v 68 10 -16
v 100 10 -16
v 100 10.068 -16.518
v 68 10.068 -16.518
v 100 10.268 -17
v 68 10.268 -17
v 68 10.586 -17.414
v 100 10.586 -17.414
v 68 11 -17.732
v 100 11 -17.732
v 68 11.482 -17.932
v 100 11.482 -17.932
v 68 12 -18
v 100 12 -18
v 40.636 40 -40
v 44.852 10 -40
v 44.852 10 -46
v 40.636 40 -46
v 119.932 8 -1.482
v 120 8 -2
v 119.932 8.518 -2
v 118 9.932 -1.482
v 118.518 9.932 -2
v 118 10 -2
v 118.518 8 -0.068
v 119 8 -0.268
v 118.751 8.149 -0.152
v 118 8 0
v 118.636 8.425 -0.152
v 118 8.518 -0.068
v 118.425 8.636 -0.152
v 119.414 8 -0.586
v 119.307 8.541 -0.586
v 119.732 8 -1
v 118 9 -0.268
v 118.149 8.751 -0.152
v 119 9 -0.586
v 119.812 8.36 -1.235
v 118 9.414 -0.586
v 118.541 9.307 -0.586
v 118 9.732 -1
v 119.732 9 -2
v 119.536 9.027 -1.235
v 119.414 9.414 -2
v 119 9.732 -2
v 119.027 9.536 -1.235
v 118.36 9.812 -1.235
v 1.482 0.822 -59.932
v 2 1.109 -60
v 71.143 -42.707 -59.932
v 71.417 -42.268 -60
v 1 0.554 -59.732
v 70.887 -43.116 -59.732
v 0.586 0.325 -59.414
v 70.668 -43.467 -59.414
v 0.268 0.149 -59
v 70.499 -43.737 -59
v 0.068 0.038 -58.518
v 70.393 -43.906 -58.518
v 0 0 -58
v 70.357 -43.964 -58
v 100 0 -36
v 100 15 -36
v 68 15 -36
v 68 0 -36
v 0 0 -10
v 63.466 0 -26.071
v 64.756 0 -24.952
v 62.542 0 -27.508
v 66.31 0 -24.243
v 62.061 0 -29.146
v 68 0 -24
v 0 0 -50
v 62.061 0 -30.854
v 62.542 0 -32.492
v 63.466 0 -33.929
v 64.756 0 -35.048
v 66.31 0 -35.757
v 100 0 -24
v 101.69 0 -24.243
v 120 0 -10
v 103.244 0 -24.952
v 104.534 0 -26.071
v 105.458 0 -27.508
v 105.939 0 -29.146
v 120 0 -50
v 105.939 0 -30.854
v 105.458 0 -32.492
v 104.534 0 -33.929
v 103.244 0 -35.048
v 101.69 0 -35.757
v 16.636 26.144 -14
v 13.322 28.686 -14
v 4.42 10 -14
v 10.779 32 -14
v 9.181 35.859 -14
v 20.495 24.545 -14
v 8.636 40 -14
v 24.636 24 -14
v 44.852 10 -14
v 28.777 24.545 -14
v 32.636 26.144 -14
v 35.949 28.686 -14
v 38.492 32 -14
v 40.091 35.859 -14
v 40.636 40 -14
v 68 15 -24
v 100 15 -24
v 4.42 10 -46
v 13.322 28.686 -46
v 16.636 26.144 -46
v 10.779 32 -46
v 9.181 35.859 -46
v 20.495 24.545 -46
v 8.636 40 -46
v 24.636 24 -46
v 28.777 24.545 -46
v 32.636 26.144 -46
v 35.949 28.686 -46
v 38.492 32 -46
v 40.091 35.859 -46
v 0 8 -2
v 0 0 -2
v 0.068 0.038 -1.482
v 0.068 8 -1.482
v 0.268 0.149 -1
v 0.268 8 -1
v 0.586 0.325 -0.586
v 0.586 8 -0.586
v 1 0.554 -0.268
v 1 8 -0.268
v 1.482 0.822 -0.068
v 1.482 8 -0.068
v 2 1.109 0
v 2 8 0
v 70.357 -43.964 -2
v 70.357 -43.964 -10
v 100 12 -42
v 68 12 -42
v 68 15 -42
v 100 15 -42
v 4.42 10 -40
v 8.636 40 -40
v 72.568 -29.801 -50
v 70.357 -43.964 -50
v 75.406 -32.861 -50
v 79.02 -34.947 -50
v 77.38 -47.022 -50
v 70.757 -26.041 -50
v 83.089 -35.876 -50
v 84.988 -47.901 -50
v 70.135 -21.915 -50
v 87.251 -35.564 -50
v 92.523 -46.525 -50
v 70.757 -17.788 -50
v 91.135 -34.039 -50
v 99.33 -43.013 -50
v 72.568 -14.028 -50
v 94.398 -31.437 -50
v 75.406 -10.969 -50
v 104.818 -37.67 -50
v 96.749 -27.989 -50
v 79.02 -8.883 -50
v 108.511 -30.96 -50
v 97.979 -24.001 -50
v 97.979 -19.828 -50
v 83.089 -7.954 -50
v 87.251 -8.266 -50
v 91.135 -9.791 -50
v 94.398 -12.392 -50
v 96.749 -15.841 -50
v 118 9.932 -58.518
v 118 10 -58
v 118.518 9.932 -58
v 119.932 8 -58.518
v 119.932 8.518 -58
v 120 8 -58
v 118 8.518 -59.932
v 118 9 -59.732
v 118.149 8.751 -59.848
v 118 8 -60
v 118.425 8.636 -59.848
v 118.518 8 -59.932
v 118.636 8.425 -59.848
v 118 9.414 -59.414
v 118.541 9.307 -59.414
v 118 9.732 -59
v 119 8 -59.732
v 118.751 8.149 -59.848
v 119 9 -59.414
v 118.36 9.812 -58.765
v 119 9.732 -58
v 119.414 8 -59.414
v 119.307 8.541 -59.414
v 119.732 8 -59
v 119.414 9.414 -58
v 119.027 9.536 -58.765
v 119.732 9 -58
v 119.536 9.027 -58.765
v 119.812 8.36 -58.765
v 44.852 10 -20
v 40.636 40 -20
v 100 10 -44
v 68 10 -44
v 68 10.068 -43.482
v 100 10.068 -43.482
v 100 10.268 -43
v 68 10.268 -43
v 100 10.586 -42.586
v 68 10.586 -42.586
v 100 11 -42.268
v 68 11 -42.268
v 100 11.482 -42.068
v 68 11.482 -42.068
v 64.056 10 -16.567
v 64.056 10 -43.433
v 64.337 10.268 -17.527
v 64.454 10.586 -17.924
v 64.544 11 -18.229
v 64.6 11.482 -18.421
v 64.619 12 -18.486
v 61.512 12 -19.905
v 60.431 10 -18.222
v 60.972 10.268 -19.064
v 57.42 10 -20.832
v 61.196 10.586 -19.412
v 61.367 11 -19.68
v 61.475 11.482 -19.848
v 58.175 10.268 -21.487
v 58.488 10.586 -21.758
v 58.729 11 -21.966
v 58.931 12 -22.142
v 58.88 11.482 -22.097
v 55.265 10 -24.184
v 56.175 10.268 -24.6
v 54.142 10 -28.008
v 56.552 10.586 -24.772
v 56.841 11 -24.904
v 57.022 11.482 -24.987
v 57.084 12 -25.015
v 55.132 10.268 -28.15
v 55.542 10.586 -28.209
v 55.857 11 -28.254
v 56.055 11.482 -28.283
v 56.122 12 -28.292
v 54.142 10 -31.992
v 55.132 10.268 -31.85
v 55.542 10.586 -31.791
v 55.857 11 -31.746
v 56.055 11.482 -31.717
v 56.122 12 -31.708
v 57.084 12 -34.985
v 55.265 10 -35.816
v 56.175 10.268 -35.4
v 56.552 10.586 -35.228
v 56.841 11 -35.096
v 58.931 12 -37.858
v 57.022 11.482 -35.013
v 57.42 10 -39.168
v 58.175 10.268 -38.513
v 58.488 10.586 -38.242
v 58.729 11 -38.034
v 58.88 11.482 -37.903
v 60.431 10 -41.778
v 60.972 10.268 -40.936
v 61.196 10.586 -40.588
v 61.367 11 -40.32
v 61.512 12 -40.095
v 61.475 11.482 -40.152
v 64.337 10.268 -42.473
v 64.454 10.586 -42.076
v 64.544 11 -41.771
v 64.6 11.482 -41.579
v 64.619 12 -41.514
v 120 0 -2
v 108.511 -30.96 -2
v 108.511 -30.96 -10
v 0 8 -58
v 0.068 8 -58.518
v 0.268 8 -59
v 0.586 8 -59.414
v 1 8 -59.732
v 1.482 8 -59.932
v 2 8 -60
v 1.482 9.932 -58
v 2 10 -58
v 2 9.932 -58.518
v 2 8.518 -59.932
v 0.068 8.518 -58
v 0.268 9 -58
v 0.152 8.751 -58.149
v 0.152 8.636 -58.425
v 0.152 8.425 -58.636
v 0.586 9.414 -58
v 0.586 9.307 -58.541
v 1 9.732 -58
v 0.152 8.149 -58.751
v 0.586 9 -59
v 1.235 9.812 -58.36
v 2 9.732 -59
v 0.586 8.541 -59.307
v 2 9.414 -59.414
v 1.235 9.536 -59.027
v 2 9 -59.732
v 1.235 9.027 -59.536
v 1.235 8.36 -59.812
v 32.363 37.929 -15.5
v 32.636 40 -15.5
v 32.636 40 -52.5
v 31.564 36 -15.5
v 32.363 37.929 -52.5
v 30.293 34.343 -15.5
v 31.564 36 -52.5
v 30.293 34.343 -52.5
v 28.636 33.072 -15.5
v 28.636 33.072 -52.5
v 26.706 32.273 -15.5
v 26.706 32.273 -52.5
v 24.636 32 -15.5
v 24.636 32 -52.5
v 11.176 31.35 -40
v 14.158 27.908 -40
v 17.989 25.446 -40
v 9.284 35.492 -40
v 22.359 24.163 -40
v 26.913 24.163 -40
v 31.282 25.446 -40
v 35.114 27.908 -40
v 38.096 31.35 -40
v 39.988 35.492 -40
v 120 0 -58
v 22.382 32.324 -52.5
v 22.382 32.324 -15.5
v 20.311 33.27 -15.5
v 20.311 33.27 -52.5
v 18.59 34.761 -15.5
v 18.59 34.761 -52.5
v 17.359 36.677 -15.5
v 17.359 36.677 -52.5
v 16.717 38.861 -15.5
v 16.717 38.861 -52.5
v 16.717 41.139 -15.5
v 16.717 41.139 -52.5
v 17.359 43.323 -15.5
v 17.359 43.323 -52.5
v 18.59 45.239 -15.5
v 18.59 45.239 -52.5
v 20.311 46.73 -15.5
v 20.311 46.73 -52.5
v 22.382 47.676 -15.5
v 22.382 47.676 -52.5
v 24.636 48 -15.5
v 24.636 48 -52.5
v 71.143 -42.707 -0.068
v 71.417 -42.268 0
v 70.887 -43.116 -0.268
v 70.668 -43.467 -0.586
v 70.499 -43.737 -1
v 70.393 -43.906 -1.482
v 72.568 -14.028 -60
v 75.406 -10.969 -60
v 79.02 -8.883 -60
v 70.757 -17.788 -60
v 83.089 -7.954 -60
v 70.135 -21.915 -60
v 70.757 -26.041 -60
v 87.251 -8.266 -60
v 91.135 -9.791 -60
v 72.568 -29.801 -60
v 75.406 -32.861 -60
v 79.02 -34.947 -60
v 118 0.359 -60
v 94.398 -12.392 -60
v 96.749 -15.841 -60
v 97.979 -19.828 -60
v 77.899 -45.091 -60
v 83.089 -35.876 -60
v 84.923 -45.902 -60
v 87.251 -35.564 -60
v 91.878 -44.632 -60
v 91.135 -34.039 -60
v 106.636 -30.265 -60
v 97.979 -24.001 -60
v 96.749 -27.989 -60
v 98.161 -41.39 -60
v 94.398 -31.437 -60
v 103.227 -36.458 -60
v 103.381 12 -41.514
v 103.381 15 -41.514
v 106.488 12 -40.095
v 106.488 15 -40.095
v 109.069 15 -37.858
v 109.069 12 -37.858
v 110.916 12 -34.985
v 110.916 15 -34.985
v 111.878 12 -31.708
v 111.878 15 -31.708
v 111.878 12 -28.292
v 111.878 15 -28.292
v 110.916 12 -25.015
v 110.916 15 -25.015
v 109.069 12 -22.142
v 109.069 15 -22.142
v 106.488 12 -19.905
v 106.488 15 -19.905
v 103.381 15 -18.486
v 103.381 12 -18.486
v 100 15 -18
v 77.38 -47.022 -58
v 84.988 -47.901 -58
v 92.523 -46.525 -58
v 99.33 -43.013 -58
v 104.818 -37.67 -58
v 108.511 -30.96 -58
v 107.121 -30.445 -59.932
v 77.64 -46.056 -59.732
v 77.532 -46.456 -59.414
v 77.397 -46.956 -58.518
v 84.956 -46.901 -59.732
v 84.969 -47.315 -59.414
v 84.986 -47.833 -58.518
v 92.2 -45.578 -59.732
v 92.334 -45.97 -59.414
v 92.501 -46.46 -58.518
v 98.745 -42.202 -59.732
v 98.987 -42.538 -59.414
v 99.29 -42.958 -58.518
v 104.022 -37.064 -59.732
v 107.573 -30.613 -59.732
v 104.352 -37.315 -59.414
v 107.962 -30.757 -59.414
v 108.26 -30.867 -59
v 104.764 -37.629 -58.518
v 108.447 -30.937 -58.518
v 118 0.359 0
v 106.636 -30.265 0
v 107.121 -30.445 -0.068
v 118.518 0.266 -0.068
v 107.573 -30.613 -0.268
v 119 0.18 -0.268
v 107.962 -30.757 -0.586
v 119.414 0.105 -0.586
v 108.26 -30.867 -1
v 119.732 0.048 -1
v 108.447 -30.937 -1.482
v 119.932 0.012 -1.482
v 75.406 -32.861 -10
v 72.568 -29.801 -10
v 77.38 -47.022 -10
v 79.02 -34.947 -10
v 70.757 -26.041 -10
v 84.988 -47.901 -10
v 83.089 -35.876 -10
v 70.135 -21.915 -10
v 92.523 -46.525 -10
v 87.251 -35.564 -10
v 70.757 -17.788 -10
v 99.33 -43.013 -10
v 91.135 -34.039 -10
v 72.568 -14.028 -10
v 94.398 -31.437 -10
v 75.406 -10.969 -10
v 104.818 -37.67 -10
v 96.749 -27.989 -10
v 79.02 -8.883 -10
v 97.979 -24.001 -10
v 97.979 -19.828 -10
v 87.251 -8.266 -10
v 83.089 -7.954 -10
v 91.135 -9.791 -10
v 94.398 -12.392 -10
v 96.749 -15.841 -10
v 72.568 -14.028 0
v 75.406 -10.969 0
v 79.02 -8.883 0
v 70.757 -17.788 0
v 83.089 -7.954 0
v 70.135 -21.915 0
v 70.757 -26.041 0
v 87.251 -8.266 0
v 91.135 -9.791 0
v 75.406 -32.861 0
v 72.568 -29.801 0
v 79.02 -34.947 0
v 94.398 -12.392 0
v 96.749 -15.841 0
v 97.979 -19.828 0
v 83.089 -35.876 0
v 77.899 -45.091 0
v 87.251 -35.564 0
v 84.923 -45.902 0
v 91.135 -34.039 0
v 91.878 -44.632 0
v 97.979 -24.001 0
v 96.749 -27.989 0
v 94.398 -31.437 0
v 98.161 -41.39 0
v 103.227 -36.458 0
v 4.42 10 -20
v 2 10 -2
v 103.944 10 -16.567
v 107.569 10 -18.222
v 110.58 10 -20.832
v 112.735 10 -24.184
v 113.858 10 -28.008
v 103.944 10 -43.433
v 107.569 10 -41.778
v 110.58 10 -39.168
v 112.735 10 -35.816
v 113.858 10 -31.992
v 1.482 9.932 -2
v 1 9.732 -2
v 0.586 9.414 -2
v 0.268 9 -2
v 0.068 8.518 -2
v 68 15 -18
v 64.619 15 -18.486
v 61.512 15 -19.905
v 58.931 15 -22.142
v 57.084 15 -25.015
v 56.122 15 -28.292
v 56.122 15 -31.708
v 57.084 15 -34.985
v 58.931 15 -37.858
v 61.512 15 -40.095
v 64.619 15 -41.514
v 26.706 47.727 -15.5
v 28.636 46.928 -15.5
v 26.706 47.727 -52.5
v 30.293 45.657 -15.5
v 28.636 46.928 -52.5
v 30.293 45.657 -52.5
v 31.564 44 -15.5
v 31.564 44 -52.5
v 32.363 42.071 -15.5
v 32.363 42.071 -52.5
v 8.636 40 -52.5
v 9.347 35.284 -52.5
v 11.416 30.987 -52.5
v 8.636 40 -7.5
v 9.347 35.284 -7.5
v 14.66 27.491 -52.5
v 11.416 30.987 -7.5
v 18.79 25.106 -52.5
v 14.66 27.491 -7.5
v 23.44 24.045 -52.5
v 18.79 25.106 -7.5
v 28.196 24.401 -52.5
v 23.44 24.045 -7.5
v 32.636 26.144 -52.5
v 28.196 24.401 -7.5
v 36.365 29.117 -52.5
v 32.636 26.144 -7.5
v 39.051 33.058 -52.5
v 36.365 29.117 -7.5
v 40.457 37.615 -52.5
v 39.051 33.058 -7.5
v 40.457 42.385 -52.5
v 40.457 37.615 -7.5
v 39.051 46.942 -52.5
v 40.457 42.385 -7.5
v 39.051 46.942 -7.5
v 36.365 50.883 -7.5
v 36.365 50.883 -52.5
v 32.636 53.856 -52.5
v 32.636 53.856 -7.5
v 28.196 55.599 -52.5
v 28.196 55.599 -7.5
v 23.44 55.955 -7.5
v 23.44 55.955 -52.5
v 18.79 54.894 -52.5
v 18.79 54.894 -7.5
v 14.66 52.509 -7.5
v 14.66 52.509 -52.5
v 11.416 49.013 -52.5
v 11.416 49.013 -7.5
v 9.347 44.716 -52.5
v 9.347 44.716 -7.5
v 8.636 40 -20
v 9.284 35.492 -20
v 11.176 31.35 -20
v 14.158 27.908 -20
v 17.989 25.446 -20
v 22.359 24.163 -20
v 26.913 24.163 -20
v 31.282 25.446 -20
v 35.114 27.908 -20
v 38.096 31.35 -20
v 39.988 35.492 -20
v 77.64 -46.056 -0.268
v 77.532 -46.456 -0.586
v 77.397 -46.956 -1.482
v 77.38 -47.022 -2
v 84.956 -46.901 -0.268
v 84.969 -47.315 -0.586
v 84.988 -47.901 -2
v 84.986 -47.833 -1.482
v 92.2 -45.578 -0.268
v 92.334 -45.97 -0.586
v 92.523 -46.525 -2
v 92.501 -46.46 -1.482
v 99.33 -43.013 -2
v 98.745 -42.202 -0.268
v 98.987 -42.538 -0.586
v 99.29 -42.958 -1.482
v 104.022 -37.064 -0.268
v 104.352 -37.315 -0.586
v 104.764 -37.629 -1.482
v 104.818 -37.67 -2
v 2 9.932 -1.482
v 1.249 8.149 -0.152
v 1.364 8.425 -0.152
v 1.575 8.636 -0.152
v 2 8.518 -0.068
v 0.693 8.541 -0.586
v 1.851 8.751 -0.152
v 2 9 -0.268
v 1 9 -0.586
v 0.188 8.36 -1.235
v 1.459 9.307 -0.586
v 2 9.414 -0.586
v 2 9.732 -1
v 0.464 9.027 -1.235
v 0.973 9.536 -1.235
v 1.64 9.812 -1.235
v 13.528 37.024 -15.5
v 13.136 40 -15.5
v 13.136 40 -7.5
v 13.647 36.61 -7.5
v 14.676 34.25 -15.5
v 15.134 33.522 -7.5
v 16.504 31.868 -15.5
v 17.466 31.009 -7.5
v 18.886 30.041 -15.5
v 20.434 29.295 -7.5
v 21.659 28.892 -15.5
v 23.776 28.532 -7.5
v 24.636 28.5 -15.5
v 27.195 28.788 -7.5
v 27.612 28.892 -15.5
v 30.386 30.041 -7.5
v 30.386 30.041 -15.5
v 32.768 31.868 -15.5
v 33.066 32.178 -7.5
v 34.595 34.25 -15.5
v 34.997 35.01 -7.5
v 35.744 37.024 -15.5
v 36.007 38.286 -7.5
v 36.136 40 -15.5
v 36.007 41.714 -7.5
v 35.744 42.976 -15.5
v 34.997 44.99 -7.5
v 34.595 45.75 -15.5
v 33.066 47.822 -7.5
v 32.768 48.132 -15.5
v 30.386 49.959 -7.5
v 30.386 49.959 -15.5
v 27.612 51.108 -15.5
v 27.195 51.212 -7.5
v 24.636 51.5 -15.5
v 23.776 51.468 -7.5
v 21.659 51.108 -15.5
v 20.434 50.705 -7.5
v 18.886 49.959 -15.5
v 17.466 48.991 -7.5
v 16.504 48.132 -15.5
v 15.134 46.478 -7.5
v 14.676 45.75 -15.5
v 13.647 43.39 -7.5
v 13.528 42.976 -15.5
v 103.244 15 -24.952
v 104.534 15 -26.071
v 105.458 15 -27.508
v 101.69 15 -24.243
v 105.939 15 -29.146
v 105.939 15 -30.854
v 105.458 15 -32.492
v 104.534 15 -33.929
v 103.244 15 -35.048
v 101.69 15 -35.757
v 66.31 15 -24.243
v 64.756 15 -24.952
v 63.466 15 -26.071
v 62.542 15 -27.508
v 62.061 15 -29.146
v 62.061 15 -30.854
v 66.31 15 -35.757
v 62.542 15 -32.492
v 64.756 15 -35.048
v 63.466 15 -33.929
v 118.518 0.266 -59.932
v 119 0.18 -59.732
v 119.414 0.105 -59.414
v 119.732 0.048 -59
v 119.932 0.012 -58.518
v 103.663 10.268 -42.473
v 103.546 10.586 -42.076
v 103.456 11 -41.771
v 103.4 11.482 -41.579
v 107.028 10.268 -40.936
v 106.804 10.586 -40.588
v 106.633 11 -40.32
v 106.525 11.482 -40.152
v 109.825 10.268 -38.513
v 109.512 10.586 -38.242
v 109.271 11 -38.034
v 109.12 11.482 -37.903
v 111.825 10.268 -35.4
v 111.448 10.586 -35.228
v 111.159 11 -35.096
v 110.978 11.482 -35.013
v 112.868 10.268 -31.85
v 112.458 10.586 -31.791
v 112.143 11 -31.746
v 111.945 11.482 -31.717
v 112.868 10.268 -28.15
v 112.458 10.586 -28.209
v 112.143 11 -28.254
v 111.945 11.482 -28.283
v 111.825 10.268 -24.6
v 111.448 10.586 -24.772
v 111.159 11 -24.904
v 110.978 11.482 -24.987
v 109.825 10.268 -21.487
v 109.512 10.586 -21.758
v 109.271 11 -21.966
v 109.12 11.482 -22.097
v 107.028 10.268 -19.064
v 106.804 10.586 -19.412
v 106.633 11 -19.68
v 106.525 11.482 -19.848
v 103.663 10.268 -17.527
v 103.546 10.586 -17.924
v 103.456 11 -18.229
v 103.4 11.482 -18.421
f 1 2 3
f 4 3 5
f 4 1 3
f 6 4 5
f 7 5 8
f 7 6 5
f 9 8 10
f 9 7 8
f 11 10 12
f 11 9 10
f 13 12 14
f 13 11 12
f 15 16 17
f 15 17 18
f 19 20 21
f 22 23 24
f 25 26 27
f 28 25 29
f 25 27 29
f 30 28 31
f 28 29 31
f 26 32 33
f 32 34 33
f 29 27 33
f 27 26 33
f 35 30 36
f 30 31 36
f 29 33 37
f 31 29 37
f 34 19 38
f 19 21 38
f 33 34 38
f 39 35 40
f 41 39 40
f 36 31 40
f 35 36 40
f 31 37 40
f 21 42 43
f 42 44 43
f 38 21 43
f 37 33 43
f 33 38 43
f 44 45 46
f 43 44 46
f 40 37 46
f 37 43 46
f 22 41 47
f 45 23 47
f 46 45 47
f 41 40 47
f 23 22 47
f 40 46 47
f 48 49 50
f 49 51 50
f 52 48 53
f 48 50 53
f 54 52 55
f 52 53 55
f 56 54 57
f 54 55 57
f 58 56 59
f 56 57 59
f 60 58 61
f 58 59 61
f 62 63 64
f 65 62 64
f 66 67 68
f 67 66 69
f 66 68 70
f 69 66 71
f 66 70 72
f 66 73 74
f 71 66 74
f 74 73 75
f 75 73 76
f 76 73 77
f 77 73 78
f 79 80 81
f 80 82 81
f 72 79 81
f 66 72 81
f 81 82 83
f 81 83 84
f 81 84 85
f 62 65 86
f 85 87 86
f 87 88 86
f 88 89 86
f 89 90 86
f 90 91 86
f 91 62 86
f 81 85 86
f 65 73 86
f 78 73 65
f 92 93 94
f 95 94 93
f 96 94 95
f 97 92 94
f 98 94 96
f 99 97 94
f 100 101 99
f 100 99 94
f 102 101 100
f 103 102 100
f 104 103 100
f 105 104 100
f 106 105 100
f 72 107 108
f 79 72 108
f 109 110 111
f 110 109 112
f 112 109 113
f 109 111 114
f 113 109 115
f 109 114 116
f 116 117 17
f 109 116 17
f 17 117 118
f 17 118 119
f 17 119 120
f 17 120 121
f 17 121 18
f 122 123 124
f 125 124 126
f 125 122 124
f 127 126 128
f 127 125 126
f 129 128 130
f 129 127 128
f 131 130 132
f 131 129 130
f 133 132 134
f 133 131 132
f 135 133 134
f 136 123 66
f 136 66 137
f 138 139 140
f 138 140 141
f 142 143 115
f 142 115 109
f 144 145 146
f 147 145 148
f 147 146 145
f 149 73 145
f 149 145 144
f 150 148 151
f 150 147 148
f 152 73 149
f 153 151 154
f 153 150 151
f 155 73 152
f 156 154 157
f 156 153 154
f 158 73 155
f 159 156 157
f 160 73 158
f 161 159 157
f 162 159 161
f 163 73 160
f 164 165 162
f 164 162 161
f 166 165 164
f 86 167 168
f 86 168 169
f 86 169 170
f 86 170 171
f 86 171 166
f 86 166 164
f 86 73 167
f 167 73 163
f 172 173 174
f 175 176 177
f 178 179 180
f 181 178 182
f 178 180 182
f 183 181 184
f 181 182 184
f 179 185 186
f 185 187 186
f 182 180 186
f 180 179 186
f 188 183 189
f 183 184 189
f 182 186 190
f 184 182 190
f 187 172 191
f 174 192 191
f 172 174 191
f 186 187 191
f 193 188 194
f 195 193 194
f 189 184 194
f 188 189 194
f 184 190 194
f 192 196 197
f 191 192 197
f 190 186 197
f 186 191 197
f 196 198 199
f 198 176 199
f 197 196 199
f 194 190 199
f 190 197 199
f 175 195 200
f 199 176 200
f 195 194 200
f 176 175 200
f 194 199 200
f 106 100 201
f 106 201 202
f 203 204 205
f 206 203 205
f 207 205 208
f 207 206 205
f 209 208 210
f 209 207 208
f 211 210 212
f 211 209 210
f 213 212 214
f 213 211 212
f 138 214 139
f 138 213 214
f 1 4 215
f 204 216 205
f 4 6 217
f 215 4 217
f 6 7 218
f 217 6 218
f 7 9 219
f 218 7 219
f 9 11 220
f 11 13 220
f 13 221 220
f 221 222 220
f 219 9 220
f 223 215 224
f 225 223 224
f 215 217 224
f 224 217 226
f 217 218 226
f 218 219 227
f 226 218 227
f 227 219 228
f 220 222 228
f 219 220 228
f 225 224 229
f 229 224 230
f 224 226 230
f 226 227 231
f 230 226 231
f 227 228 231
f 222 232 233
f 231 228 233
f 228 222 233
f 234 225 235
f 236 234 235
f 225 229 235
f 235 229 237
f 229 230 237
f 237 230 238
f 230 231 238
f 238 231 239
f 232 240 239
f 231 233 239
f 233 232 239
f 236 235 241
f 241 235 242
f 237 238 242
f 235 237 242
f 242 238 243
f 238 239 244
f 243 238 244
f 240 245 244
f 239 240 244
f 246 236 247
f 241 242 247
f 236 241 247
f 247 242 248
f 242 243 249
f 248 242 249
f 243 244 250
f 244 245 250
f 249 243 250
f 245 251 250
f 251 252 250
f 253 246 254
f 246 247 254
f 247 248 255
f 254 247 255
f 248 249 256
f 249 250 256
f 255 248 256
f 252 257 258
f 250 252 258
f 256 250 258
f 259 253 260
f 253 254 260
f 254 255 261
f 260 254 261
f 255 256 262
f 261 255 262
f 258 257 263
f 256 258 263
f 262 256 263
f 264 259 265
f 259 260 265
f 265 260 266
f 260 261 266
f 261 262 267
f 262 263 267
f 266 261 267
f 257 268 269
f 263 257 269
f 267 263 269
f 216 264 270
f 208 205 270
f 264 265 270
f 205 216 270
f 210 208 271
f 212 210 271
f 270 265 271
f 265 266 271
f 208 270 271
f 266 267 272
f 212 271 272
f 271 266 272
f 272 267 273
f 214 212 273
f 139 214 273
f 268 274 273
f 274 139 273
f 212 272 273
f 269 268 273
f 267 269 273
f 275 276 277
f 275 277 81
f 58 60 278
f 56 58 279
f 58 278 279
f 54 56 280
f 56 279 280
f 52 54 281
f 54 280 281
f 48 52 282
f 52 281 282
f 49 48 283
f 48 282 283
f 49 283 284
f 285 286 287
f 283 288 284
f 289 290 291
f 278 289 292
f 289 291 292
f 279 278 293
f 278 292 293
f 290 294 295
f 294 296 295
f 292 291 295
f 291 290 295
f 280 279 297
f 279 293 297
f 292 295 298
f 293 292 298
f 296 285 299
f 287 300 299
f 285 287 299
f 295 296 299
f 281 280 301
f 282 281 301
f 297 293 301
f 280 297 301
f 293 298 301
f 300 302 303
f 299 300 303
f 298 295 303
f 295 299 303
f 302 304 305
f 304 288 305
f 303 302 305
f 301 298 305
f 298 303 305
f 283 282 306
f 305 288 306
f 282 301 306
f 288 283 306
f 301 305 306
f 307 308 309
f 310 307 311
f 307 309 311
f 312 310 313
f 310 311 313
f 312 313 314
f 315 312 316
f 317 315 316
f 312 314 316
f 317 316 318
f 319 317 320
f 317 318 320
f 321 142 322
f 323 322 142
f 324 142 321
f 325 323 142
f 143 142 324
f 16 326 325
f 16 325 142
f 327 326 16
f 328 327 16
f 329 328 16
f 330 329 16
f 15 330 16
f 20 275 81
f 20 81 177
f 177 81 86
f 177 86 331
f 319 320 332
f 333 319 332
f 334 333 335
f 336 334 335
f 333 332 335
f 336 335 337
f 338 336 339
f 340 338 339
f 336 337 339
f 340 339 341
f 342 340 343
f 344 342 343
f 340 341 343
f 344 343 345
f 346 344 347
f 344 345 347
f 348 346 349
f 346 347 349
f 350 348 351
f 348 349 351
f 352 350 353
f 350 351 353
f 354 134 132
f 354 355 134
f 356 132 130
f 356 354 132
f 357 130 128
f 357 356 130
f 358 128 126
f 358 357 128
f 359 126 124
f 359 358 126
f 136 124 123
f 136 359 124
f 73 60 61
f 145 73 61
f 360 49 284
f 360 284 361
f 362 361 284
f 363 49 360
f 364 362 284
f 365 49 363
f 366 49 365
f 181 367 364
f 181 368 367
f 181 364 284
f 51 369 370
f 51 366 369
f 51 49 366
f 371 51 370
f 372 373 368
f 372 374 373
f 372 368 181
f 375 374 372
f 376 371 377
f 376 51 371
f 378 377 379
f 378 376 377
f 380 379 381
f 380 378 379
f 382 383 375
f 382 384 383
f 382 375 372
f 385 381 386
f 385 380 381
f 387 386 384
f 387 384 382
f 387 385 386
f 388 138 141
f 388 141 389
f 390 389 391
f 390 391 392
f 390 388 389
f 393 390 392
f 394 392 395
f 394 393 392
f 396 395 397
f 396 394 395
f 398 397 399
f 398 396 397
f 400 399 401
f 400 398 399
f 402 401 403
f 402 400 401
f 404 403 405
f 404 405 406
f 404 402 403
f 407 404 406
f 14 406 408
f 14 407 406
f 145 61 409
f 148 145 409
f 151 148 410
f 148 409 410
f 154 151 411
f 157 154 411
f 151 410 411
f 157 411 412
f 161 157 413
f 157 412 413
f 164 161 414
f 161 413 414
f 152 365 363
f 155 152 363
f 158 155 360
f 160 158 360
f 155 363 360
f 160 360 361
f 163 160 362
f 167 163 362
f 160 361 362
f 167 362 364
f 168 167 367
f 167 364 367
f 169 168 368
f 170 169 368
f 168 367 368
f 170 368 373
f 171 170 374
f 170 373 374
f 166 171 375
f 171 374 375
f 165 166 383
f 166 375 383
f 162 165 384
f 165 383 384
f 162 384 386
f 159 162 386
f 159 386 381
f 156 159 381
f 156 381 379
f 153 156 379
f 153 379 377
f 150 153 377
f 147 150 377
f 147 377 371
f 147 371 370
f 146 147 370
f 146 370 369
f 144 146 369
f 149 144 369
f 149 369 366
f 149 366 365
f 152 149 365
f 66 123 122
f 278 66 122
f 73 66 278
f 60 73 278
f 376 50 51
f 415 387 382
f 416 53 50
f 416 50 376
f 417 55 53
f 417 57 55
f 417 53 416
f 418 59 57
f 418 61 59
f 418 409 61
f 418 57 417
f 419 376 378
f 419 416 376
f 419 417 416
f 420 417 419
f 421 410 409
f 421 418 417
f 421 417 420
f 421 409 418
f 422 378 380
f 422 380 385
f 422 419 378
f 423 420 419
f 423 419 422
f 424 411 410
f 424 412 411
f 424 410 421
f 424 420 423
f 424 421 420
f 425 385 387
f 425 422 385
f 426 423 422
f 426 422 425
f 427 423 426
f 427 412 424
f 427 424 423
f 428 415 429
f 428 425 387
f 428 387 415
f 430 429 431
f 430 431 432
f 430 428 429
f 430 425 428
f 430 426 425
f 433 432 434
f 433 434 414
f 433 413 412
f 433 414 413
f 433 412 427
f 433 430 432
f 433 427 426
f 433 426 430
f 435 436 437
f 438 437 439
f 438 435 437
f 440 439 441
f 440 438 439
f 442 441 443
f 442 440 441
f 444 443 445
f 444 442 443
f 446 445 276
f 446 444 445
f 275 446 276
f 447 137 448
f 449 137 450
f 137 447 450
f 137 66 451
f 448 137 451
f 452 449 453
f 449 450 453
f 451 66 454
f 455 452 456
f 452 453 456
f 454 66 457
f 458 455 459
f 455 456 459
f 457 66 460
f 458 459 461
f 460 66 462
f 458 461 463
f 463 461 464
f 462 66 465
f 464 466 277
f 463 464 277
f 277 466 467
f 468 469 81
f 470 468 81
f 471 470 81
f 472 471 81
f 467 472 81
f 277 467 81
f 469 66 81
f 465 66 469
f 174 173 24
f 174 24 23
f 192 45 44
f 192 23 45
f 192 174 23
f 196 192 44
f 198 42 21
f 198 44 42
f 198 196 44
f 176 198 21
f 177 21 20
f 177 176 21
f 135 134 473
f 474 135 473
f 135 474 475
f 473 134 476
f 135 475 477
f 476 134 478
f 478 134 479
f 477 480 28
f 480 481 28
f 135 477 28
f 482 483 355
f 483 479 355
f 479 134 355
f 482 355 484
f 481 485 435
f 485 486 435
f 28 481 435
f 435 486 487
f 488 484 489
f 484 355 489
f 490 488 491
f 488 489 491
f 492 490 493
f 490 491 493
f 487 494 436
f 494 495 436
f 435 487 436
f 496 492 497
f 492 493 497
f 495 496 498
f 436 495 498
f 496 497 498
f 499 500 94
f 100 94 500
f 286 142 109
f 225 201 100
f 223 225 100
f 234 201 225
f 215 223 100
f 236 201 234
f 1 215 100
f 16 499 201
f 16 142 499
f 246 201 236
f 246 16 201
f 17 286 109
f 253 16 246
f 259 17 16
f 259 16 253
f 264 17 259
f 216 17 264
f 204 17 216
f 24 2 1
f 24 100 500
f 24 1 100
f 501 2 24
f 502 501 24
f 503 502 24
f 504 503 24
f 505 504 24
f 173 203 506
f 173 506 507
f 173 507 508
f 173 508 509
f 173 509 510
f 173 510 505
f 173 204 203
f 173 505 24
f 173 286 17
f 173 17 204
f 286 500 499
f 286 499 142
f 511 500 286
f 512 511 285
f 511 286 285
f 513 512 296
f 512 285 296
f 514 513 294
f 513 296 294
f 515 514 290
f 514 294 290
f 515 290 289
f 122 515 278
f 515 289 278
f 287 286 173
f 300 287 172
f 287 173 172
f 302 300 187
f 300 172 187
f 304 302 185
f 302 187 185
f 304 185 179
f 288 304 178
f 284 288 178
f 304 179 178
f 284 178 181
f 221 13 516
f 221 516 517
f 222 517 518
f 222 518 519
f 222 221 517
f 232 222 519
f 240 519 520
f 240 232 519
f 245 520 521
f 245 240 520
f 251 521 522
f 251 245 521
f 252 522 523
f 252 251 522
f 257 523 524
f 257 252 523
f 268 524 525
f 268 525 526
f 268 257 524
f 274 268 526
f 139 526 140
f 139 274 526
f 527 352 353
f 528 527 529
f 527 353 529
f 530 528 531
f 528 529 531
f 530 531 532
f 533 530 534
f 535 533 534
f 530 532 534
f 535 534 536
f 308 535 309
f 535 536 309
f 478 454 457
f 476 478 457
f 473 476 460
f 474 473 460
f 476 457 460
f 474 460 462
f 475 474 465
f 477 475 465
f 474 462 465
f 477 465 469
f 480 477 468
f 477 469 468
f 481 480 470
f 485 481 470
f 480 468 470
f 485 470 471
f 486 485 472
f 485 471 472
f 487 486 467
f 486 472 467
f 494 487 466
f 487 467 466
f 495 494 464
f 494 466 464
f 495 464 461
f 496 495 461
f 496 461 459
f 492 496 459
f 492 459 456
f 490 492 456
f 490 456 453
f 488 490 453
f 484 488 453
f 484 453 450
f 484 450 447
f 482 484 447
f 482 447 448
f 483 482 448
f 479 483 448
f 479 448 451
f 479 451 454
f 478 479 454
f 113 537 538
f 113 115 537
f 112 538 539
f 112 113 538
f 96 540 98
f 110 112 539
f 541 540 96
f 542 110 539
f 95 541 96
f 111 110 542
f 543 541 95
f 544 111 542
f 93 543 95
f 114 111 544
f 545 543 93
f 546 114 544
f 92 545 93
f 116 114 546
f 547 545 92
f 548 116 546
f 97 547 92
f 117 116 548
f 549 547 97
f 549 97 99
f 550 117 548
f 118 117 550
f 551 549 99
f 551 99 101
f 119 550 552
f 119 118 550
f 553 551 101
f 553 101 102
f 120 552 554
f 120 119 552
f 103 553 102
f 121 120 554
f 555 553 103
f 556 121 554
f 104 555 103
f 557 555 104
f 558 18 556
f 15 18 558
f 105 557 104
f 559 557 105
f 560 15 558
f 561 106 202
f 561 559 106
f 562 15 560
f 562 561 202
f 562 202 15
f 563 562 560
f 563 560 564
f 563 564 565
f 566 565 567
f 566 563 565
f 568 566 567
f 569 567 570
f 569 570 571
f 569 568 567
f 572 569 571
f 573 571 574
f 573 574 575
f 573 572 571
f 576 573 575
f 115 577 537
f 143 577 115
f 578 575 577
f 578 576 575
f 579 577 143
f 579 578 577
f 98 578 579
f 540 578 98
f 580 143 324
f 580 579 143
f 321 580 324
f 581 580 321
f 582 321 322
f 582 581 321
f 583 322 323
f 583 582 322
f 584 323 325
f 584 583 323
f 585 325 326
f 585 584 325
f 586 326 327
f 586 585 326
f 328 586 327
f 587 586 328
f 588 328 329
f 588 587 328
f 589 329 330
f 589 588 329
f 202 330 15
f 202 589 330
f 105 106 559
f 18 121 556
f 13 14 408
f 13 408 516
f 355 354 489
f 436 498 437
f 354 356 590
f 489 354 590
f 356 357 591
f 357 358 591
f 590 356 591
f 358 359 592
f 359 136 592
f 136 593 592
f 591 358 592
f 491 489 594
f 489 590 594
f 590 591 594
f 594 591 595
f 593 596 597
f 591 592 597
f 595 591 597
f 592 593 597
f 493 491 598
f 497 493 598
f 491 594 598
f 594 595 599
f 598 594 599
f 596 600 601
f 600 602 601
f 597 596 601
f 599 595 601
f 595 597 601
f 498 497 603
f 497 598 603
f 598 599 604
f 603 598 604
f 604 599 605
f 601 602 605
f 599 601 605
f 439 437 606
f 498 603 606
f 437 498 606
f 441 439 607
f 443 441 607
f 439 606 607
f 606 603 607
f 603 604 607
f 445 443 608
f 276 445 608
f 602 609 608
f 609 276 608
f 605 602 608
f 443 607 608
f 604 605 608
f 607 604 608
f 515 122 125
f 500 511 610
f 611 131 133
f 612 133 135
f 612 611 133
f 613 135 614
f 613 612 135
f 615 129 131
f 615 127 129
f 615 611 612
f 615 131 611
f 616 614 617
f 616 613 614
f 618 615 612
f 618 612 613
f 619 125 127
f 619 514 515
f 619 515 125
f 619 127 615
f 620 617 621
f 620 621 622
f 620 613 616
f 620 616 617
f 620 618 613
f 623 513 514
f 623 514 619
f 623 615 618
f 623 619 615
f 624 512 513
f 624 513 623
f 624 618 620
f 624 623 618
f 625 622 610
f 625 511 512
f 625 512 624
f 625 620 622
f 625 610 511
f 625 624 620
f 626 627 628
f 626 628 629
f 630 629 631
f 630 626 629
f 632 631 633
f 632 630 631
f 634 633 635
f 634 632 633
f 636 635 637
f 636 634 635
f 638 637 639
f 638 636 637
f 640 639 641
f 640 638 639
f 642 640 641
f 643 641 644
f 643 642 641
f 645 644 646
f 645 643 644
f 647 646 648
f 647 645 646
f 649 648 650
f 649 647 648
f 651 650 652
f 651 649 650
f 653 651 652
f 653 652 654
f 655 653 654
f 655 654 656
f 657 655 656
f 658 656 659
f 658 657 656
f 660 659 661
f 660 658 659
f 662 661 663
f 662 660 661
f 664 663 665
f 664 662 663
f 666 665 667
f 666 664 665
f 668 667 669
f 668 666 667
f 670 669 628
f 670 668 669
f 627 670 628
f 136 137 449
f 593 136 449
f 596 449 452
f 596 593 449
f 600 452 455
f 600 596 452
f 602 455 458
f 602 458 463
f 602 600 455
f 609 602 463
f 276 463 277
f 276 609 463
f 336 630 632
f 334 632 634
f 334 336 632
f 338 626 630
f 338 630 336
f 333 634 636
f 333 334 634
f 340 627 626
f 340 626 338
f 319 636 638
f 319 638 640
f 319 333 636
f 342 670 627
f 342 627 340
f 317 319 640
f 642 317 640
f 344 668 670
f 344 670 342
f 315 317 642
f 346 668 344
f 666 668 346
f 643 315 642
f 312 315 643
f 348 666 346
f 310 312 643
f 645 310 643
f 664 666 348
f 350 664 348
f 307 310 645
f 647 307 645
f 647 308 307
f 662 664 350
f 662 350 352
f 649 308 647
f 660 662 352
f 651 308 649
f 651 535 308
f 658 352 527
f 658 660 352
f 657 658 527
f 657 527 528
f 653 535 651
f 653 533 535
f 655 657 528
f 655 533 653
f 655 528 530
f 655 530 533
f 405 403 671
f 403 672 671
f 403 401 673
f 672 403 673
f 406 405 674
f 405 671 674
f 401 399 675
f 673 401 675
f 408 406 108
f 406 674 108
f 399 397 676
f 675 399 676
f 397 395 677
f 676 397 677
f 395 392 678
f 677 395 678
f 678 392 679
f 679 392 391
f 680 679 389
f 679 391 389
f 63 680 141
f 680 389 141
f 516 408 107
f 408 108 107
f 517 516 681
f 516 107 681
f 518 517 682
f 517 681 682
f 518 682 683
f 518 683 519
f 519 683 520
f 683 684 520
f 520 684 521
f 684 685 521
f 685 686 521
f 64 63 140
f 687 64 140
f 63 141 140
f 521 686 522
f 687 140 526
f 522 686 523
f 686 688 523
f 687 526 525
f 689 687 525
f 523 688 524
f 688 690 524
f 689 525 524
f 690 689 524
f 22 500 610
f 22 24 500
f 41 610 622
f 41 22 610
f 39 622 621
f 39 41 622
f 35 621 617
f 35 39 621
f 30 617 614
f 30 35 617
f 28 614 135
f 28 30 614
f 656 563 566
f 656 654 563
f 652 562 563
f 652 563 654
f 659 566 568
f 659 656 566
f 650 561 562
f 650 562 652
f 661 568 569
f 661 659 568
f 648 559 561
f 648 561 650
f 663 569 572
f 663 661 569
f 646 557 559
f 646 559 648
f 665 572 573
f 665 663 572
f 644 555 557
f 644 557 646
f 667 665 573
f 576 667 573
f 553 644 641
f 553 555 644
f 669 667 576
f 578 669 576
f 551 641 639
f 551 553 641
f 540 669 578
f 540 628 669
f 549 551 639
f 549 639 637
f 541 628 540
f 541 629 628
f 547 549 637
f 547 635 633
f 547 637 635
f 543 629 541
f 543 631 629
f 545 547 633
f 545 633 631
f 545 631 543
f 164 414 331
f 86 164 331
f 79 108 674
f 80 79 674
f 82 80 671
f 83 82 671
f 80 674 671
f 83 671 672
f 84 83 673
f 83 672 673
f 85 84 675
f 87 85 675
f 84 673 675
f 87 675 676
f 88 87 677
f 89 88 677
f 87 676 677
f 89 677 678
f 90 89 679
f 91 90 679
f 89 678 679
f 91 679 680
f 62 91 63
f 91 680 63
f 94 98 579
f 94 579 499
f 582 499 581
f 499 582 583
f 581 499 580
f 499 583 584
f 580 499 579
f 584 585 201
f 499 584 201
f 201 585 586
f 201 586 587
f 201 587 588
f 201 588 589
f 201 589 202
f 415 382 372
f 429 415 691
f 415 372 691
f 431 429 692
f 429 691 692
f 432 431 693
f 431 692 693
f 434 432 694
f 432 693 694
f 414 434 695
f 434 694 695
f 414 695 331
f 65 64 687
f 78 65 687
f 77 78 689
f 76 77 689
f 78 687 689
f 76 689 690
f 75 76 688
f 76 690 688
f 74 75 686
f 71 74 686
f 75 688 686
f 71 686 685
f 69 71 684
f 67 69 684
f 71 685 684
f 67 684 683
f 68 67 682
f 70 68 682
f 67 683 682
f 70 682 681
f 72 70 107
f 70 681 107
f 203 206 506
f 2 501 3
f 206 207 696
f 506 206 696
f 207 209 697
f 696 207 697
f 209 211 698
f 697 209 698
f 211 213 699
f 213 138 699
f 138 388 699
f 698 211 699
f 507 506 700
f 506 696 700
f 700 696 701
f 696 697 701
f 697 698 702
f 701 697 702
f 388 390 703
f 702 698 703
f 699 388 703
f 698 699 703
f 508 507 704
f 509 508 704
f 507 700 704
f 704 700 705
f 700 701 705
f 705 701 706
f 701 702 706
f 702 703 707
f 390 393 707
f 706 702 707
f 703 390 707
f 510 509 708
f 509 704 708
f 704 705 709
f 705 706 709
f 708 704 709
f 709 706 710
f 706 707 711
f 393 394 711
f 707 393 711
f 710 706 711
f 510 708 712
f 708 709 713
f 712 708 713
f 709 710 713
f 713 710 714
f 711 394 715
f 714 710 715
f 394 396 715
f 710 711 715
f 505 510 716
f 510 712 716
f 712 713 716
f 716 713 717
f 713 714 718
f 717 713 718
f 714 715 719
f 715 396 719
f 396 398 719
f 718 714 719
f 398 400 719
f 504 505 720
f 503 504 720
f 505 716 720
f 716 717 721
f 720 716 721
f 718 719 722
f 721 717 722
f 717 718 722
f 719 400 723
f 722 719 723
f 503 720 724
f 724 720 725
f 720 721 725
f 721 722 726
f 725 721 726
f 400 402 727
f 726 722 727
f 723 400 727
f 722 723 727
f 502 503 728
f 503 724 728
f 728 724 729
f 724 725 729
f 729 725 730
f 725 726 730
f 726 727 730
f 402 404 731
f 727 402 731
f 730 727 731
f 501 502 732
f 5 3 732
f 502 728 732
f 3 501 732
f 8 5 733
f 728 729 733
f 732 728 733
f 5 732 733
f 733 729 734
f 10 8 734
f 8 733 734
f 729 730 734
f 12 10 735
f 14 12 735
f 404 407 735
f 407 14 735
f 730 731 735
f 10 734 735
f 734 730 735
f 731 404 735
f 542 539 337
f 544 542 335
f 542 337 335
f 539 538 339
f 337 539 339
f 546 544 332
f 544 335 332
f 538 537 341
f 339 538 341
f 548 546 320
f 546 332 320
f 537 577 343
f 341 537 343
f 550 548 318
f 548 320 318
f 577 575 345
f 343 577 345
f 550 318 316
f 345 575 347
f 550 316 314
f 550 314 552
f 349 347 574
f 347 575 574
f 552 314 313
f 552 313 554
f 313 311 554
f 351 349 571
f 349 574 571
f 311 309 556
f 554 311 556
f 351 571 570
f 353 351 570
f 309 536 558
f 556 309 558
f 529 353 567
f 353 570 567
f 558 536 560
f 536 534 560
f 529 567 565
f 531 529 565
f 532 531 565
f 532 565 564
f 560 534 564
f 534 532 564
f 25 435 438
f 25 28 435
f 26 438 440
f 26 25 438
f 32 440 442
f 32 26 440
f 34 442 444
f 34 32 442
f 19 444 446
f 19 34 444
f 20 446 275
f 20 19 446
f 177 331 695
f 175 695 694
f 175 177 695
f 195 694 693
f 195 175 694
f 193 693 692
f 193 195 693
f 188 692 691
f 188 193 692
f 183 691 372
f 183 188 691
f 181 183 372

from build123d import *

# Parameters (mm, degrees)
SKETCH1_W                  = 120
SKETCH1_H                  = 60
BOSS_EXTRUDE1_DEPTH        = 10
BOSS_EXTRUDE2_DEPTH        = 10
F_25_0_28_DIAMETER_HOLE1_D = 28
BOSS_EXTRUDE3_DEPTH        = 5
CUT_EXTRUDE1_DEPTH         = 147.130542204
SKETCH7_R                  = 11.5
BOSS_EXTRUDE4_DEPTH        = 22.5
BOSS_EXTRUDE5_DEPTH        = 16
CUT_EXTRUDE2_DEPTH         = 10
BOSS_EXTRUDE6_DEPTH        = 14.5
BOSS_EXTRUDE6_DEPTH_BACK   = 22.5
SKETCH7_7_R                = 11.5
SKETCH7_7_R_2              = 8
FILLET1_R                  = 2


with BuildPart() as part:
    # Sketch1 → Boss-Extrude1 (new body)
    with BuildSketch(Plane(origin=(0, 0, 0), x_dir=(1, 0, 0), z_dir=(0, 1, 0))):
        with Locations((60, 30)):
            Rectangle(SKETCH1_W, SKETCH1_H)
    extrude(amount=BOSS_EXTRUDE1_DEPTH)

    # Sketch2 → Boss-Extrude2 (add)
    with BuildSketch(Plane.XY):
        with BuildLine():
            Line((0, 10), (0, 0))
            Line((0, 0), (70.357344256, -43.964148108))
            ThreePointArc((70.357344256, -43.964148108), (92.522919584, -46.524792309), (108.511026917, -30.960408214))
            Line((108.511026917, -30.960408214), (120, 0))
            Line((120, 0), (120, 10))
            Line((120, 10), (0, 10))
        make_face()
    boss_extrude2 = extrude(amount=-BOSS_EXTRUDE2_DEPTH)

    # Mirror1: Boss-Extrude2 across plane
    add(boss_extrude2.mirror(Plane.XY.offset(-30)))

    # Ø25.0 (28) Diameter Hole1 (through all)
    with Locations(Plane(origin=(84.135245127, -21.914897608, 0), x_dir=(1, 0, 0), z_dir=(0, 0, 1))):
        with Locations((0, 0)):
            Hole(F_25_0_28_DIAMETER_HOLE1_D / 2)

    # Sketch5 → Boss-Extrude3 (add)
    with BuildSketch(Plane(origin=(0, 10, 0), x_dir=(1, 0, 0), z_dir=(0, 1, 0))):
        with BuildLine():
            Line((100, 18), (68, 18))
            ThreePointArc((68, 18), (56, 30), (68, 42))
            Line((68, 42), (100, 42))
            ThreePointArc((100, 42), (112, 30), (100, 18))
        make_face()
        with BuildLine():
            Line((100, 24), (68, 24))
            ThreePointArc((68, 24), (62, 30), (68, 36))
            Line((68, 36), (100, 36))
            ThreePointArc((100, 36), (106, 30), (100, 24))
        make_face(mode=Mode.SUBTRACT)
    extrude(amount=BOSS_EXTRUDE3_DEPTH)

    # Sketch5<2> → Cut-Extrude1 (cut, through all)
    with BuildSketch(Plane(origin=(0, 10, 0), x_dir=(1, 0, 0), z_dir=(0, 1, 0))):
        with BuildLine():
            Line((68, 24), (100, 24))
            ThreePointArc((100, 24), (106, 30), (100, 36))
            Line((100, 36), (68, 36))
            ThreePointArc((68, 36), (62, 30), (68, 24))
        make_face()
    extrude(amount=-CUT_EXTRUDE1_DEPTH, mode=Mode.SUBTRACT)



with BuildPart() as body_2:
    # Sketch7 → Boss-Extrude4 (new, symmetric)
    with BuildSketch(Plane.XY.offset(-30)):
        with BuildLine():
            ThreePointArc((40.635783634, 40), (24.635783634, 56), (8.635783634, 40))
            ThreePointArc((8.635783634, 40), (24.635783634, 24), (40.635783634, 40))
        make_face()
        with Locations((24.635783634, 40)):
            Circle(SKETCH7_R, mode=Mode.SUBTRACT)
    extrude(amount=BOSS_EXTRUDE4_DEPTH, both=True)


with BuildPart() as part_1:
    add(part.part)

    add(body_2.part)  # Boss-Extrude5 merges body 2
    # Sketch7<3> → Boss-Extrude5 (add, symmetric)
    with BuildSketch(Plane.XY.offset(-30)):
        with BuildLine():
            Line((8.635783634, 40), (4.419558593, 10))
            Line((4.419558593, 10), (44.852008675, 10))
            Line((44.852008675, 10), (40.635783634, 40))
            ThreePointArc((40.635783634, 40), (24.635783634, 24), (8.635783634, 40))
        make_face()
    extrude(amount=BOSS_EXTRUDE5_DEPTH, both=True)

    # Sketch7<5> → Cut-Extrude2 (cut, symmetric)
    with BuildSketch(Plane.XY.offset(-30)):
        with BuildLine():
            Line((8.635783634, 40), (4.419558593, 10))
            Line((4.419558593, 10), (44.852008675, 10))
            Line((44.852008675, 10), (40.635783634, 40))
            ThreePointArc((40.635783634, 40), (24.635783634, 24), (8.635783634, 40))
        make_face()
    extrude(amount=CUT_EXTRUDE2_DEPTH, both=True, mode=Mode.SUBTRACT)

    # Sketch7<7> → Boss-Extrude6 (add, two sides: drawn at the far end of the back side and taken through both)
    with BuildSketch(Plane.XY.offset(-30).offset(-BOSS_EXTRUDE6_DEPTH_BACK)):
        with Locations((24.635783634, 40)):
            Circle(SKETCH7_7_R)
        with Locations((24.635783634, 40)):
            Circle(SKETCH7_7_R_2, mode=Mode.SUBTRACT)
    extrude(amount=BOSS_EXTRUDE6_DEPTH + BOSS_EXTRUDE6_DEPTH_BACK)

    # Fillet1
    fillet1_edges = [part_1.edges().sort_by_distance(p)[0] for p in [
        (114.255513458, -15.480204107, -60),
        (92.522919584, -46.524792309, -60),
        (114.255513458, -15.480204107, 0),
        (92.522919584, -46.524792309, 0),
        (84, 10, -18),
        (56, 10, -30),
        (84, 10, -42),
        (120, 5, -60),
        (120, 5, 0),
        (0, 5, -60),
        (35.178672128, -21.982074054, -60),
        (0, 5, 0),
        (35.178672128, -21.982074054, 0),
        (60, 10, -60),
        (0, 10, -30),
        (120, 10, -30),
        (60, 10, 0),
        (112, 10, -30),
    ]]
    fillet(fillet1_edges, radius=FILLET1_R)


solid = part_1.part
